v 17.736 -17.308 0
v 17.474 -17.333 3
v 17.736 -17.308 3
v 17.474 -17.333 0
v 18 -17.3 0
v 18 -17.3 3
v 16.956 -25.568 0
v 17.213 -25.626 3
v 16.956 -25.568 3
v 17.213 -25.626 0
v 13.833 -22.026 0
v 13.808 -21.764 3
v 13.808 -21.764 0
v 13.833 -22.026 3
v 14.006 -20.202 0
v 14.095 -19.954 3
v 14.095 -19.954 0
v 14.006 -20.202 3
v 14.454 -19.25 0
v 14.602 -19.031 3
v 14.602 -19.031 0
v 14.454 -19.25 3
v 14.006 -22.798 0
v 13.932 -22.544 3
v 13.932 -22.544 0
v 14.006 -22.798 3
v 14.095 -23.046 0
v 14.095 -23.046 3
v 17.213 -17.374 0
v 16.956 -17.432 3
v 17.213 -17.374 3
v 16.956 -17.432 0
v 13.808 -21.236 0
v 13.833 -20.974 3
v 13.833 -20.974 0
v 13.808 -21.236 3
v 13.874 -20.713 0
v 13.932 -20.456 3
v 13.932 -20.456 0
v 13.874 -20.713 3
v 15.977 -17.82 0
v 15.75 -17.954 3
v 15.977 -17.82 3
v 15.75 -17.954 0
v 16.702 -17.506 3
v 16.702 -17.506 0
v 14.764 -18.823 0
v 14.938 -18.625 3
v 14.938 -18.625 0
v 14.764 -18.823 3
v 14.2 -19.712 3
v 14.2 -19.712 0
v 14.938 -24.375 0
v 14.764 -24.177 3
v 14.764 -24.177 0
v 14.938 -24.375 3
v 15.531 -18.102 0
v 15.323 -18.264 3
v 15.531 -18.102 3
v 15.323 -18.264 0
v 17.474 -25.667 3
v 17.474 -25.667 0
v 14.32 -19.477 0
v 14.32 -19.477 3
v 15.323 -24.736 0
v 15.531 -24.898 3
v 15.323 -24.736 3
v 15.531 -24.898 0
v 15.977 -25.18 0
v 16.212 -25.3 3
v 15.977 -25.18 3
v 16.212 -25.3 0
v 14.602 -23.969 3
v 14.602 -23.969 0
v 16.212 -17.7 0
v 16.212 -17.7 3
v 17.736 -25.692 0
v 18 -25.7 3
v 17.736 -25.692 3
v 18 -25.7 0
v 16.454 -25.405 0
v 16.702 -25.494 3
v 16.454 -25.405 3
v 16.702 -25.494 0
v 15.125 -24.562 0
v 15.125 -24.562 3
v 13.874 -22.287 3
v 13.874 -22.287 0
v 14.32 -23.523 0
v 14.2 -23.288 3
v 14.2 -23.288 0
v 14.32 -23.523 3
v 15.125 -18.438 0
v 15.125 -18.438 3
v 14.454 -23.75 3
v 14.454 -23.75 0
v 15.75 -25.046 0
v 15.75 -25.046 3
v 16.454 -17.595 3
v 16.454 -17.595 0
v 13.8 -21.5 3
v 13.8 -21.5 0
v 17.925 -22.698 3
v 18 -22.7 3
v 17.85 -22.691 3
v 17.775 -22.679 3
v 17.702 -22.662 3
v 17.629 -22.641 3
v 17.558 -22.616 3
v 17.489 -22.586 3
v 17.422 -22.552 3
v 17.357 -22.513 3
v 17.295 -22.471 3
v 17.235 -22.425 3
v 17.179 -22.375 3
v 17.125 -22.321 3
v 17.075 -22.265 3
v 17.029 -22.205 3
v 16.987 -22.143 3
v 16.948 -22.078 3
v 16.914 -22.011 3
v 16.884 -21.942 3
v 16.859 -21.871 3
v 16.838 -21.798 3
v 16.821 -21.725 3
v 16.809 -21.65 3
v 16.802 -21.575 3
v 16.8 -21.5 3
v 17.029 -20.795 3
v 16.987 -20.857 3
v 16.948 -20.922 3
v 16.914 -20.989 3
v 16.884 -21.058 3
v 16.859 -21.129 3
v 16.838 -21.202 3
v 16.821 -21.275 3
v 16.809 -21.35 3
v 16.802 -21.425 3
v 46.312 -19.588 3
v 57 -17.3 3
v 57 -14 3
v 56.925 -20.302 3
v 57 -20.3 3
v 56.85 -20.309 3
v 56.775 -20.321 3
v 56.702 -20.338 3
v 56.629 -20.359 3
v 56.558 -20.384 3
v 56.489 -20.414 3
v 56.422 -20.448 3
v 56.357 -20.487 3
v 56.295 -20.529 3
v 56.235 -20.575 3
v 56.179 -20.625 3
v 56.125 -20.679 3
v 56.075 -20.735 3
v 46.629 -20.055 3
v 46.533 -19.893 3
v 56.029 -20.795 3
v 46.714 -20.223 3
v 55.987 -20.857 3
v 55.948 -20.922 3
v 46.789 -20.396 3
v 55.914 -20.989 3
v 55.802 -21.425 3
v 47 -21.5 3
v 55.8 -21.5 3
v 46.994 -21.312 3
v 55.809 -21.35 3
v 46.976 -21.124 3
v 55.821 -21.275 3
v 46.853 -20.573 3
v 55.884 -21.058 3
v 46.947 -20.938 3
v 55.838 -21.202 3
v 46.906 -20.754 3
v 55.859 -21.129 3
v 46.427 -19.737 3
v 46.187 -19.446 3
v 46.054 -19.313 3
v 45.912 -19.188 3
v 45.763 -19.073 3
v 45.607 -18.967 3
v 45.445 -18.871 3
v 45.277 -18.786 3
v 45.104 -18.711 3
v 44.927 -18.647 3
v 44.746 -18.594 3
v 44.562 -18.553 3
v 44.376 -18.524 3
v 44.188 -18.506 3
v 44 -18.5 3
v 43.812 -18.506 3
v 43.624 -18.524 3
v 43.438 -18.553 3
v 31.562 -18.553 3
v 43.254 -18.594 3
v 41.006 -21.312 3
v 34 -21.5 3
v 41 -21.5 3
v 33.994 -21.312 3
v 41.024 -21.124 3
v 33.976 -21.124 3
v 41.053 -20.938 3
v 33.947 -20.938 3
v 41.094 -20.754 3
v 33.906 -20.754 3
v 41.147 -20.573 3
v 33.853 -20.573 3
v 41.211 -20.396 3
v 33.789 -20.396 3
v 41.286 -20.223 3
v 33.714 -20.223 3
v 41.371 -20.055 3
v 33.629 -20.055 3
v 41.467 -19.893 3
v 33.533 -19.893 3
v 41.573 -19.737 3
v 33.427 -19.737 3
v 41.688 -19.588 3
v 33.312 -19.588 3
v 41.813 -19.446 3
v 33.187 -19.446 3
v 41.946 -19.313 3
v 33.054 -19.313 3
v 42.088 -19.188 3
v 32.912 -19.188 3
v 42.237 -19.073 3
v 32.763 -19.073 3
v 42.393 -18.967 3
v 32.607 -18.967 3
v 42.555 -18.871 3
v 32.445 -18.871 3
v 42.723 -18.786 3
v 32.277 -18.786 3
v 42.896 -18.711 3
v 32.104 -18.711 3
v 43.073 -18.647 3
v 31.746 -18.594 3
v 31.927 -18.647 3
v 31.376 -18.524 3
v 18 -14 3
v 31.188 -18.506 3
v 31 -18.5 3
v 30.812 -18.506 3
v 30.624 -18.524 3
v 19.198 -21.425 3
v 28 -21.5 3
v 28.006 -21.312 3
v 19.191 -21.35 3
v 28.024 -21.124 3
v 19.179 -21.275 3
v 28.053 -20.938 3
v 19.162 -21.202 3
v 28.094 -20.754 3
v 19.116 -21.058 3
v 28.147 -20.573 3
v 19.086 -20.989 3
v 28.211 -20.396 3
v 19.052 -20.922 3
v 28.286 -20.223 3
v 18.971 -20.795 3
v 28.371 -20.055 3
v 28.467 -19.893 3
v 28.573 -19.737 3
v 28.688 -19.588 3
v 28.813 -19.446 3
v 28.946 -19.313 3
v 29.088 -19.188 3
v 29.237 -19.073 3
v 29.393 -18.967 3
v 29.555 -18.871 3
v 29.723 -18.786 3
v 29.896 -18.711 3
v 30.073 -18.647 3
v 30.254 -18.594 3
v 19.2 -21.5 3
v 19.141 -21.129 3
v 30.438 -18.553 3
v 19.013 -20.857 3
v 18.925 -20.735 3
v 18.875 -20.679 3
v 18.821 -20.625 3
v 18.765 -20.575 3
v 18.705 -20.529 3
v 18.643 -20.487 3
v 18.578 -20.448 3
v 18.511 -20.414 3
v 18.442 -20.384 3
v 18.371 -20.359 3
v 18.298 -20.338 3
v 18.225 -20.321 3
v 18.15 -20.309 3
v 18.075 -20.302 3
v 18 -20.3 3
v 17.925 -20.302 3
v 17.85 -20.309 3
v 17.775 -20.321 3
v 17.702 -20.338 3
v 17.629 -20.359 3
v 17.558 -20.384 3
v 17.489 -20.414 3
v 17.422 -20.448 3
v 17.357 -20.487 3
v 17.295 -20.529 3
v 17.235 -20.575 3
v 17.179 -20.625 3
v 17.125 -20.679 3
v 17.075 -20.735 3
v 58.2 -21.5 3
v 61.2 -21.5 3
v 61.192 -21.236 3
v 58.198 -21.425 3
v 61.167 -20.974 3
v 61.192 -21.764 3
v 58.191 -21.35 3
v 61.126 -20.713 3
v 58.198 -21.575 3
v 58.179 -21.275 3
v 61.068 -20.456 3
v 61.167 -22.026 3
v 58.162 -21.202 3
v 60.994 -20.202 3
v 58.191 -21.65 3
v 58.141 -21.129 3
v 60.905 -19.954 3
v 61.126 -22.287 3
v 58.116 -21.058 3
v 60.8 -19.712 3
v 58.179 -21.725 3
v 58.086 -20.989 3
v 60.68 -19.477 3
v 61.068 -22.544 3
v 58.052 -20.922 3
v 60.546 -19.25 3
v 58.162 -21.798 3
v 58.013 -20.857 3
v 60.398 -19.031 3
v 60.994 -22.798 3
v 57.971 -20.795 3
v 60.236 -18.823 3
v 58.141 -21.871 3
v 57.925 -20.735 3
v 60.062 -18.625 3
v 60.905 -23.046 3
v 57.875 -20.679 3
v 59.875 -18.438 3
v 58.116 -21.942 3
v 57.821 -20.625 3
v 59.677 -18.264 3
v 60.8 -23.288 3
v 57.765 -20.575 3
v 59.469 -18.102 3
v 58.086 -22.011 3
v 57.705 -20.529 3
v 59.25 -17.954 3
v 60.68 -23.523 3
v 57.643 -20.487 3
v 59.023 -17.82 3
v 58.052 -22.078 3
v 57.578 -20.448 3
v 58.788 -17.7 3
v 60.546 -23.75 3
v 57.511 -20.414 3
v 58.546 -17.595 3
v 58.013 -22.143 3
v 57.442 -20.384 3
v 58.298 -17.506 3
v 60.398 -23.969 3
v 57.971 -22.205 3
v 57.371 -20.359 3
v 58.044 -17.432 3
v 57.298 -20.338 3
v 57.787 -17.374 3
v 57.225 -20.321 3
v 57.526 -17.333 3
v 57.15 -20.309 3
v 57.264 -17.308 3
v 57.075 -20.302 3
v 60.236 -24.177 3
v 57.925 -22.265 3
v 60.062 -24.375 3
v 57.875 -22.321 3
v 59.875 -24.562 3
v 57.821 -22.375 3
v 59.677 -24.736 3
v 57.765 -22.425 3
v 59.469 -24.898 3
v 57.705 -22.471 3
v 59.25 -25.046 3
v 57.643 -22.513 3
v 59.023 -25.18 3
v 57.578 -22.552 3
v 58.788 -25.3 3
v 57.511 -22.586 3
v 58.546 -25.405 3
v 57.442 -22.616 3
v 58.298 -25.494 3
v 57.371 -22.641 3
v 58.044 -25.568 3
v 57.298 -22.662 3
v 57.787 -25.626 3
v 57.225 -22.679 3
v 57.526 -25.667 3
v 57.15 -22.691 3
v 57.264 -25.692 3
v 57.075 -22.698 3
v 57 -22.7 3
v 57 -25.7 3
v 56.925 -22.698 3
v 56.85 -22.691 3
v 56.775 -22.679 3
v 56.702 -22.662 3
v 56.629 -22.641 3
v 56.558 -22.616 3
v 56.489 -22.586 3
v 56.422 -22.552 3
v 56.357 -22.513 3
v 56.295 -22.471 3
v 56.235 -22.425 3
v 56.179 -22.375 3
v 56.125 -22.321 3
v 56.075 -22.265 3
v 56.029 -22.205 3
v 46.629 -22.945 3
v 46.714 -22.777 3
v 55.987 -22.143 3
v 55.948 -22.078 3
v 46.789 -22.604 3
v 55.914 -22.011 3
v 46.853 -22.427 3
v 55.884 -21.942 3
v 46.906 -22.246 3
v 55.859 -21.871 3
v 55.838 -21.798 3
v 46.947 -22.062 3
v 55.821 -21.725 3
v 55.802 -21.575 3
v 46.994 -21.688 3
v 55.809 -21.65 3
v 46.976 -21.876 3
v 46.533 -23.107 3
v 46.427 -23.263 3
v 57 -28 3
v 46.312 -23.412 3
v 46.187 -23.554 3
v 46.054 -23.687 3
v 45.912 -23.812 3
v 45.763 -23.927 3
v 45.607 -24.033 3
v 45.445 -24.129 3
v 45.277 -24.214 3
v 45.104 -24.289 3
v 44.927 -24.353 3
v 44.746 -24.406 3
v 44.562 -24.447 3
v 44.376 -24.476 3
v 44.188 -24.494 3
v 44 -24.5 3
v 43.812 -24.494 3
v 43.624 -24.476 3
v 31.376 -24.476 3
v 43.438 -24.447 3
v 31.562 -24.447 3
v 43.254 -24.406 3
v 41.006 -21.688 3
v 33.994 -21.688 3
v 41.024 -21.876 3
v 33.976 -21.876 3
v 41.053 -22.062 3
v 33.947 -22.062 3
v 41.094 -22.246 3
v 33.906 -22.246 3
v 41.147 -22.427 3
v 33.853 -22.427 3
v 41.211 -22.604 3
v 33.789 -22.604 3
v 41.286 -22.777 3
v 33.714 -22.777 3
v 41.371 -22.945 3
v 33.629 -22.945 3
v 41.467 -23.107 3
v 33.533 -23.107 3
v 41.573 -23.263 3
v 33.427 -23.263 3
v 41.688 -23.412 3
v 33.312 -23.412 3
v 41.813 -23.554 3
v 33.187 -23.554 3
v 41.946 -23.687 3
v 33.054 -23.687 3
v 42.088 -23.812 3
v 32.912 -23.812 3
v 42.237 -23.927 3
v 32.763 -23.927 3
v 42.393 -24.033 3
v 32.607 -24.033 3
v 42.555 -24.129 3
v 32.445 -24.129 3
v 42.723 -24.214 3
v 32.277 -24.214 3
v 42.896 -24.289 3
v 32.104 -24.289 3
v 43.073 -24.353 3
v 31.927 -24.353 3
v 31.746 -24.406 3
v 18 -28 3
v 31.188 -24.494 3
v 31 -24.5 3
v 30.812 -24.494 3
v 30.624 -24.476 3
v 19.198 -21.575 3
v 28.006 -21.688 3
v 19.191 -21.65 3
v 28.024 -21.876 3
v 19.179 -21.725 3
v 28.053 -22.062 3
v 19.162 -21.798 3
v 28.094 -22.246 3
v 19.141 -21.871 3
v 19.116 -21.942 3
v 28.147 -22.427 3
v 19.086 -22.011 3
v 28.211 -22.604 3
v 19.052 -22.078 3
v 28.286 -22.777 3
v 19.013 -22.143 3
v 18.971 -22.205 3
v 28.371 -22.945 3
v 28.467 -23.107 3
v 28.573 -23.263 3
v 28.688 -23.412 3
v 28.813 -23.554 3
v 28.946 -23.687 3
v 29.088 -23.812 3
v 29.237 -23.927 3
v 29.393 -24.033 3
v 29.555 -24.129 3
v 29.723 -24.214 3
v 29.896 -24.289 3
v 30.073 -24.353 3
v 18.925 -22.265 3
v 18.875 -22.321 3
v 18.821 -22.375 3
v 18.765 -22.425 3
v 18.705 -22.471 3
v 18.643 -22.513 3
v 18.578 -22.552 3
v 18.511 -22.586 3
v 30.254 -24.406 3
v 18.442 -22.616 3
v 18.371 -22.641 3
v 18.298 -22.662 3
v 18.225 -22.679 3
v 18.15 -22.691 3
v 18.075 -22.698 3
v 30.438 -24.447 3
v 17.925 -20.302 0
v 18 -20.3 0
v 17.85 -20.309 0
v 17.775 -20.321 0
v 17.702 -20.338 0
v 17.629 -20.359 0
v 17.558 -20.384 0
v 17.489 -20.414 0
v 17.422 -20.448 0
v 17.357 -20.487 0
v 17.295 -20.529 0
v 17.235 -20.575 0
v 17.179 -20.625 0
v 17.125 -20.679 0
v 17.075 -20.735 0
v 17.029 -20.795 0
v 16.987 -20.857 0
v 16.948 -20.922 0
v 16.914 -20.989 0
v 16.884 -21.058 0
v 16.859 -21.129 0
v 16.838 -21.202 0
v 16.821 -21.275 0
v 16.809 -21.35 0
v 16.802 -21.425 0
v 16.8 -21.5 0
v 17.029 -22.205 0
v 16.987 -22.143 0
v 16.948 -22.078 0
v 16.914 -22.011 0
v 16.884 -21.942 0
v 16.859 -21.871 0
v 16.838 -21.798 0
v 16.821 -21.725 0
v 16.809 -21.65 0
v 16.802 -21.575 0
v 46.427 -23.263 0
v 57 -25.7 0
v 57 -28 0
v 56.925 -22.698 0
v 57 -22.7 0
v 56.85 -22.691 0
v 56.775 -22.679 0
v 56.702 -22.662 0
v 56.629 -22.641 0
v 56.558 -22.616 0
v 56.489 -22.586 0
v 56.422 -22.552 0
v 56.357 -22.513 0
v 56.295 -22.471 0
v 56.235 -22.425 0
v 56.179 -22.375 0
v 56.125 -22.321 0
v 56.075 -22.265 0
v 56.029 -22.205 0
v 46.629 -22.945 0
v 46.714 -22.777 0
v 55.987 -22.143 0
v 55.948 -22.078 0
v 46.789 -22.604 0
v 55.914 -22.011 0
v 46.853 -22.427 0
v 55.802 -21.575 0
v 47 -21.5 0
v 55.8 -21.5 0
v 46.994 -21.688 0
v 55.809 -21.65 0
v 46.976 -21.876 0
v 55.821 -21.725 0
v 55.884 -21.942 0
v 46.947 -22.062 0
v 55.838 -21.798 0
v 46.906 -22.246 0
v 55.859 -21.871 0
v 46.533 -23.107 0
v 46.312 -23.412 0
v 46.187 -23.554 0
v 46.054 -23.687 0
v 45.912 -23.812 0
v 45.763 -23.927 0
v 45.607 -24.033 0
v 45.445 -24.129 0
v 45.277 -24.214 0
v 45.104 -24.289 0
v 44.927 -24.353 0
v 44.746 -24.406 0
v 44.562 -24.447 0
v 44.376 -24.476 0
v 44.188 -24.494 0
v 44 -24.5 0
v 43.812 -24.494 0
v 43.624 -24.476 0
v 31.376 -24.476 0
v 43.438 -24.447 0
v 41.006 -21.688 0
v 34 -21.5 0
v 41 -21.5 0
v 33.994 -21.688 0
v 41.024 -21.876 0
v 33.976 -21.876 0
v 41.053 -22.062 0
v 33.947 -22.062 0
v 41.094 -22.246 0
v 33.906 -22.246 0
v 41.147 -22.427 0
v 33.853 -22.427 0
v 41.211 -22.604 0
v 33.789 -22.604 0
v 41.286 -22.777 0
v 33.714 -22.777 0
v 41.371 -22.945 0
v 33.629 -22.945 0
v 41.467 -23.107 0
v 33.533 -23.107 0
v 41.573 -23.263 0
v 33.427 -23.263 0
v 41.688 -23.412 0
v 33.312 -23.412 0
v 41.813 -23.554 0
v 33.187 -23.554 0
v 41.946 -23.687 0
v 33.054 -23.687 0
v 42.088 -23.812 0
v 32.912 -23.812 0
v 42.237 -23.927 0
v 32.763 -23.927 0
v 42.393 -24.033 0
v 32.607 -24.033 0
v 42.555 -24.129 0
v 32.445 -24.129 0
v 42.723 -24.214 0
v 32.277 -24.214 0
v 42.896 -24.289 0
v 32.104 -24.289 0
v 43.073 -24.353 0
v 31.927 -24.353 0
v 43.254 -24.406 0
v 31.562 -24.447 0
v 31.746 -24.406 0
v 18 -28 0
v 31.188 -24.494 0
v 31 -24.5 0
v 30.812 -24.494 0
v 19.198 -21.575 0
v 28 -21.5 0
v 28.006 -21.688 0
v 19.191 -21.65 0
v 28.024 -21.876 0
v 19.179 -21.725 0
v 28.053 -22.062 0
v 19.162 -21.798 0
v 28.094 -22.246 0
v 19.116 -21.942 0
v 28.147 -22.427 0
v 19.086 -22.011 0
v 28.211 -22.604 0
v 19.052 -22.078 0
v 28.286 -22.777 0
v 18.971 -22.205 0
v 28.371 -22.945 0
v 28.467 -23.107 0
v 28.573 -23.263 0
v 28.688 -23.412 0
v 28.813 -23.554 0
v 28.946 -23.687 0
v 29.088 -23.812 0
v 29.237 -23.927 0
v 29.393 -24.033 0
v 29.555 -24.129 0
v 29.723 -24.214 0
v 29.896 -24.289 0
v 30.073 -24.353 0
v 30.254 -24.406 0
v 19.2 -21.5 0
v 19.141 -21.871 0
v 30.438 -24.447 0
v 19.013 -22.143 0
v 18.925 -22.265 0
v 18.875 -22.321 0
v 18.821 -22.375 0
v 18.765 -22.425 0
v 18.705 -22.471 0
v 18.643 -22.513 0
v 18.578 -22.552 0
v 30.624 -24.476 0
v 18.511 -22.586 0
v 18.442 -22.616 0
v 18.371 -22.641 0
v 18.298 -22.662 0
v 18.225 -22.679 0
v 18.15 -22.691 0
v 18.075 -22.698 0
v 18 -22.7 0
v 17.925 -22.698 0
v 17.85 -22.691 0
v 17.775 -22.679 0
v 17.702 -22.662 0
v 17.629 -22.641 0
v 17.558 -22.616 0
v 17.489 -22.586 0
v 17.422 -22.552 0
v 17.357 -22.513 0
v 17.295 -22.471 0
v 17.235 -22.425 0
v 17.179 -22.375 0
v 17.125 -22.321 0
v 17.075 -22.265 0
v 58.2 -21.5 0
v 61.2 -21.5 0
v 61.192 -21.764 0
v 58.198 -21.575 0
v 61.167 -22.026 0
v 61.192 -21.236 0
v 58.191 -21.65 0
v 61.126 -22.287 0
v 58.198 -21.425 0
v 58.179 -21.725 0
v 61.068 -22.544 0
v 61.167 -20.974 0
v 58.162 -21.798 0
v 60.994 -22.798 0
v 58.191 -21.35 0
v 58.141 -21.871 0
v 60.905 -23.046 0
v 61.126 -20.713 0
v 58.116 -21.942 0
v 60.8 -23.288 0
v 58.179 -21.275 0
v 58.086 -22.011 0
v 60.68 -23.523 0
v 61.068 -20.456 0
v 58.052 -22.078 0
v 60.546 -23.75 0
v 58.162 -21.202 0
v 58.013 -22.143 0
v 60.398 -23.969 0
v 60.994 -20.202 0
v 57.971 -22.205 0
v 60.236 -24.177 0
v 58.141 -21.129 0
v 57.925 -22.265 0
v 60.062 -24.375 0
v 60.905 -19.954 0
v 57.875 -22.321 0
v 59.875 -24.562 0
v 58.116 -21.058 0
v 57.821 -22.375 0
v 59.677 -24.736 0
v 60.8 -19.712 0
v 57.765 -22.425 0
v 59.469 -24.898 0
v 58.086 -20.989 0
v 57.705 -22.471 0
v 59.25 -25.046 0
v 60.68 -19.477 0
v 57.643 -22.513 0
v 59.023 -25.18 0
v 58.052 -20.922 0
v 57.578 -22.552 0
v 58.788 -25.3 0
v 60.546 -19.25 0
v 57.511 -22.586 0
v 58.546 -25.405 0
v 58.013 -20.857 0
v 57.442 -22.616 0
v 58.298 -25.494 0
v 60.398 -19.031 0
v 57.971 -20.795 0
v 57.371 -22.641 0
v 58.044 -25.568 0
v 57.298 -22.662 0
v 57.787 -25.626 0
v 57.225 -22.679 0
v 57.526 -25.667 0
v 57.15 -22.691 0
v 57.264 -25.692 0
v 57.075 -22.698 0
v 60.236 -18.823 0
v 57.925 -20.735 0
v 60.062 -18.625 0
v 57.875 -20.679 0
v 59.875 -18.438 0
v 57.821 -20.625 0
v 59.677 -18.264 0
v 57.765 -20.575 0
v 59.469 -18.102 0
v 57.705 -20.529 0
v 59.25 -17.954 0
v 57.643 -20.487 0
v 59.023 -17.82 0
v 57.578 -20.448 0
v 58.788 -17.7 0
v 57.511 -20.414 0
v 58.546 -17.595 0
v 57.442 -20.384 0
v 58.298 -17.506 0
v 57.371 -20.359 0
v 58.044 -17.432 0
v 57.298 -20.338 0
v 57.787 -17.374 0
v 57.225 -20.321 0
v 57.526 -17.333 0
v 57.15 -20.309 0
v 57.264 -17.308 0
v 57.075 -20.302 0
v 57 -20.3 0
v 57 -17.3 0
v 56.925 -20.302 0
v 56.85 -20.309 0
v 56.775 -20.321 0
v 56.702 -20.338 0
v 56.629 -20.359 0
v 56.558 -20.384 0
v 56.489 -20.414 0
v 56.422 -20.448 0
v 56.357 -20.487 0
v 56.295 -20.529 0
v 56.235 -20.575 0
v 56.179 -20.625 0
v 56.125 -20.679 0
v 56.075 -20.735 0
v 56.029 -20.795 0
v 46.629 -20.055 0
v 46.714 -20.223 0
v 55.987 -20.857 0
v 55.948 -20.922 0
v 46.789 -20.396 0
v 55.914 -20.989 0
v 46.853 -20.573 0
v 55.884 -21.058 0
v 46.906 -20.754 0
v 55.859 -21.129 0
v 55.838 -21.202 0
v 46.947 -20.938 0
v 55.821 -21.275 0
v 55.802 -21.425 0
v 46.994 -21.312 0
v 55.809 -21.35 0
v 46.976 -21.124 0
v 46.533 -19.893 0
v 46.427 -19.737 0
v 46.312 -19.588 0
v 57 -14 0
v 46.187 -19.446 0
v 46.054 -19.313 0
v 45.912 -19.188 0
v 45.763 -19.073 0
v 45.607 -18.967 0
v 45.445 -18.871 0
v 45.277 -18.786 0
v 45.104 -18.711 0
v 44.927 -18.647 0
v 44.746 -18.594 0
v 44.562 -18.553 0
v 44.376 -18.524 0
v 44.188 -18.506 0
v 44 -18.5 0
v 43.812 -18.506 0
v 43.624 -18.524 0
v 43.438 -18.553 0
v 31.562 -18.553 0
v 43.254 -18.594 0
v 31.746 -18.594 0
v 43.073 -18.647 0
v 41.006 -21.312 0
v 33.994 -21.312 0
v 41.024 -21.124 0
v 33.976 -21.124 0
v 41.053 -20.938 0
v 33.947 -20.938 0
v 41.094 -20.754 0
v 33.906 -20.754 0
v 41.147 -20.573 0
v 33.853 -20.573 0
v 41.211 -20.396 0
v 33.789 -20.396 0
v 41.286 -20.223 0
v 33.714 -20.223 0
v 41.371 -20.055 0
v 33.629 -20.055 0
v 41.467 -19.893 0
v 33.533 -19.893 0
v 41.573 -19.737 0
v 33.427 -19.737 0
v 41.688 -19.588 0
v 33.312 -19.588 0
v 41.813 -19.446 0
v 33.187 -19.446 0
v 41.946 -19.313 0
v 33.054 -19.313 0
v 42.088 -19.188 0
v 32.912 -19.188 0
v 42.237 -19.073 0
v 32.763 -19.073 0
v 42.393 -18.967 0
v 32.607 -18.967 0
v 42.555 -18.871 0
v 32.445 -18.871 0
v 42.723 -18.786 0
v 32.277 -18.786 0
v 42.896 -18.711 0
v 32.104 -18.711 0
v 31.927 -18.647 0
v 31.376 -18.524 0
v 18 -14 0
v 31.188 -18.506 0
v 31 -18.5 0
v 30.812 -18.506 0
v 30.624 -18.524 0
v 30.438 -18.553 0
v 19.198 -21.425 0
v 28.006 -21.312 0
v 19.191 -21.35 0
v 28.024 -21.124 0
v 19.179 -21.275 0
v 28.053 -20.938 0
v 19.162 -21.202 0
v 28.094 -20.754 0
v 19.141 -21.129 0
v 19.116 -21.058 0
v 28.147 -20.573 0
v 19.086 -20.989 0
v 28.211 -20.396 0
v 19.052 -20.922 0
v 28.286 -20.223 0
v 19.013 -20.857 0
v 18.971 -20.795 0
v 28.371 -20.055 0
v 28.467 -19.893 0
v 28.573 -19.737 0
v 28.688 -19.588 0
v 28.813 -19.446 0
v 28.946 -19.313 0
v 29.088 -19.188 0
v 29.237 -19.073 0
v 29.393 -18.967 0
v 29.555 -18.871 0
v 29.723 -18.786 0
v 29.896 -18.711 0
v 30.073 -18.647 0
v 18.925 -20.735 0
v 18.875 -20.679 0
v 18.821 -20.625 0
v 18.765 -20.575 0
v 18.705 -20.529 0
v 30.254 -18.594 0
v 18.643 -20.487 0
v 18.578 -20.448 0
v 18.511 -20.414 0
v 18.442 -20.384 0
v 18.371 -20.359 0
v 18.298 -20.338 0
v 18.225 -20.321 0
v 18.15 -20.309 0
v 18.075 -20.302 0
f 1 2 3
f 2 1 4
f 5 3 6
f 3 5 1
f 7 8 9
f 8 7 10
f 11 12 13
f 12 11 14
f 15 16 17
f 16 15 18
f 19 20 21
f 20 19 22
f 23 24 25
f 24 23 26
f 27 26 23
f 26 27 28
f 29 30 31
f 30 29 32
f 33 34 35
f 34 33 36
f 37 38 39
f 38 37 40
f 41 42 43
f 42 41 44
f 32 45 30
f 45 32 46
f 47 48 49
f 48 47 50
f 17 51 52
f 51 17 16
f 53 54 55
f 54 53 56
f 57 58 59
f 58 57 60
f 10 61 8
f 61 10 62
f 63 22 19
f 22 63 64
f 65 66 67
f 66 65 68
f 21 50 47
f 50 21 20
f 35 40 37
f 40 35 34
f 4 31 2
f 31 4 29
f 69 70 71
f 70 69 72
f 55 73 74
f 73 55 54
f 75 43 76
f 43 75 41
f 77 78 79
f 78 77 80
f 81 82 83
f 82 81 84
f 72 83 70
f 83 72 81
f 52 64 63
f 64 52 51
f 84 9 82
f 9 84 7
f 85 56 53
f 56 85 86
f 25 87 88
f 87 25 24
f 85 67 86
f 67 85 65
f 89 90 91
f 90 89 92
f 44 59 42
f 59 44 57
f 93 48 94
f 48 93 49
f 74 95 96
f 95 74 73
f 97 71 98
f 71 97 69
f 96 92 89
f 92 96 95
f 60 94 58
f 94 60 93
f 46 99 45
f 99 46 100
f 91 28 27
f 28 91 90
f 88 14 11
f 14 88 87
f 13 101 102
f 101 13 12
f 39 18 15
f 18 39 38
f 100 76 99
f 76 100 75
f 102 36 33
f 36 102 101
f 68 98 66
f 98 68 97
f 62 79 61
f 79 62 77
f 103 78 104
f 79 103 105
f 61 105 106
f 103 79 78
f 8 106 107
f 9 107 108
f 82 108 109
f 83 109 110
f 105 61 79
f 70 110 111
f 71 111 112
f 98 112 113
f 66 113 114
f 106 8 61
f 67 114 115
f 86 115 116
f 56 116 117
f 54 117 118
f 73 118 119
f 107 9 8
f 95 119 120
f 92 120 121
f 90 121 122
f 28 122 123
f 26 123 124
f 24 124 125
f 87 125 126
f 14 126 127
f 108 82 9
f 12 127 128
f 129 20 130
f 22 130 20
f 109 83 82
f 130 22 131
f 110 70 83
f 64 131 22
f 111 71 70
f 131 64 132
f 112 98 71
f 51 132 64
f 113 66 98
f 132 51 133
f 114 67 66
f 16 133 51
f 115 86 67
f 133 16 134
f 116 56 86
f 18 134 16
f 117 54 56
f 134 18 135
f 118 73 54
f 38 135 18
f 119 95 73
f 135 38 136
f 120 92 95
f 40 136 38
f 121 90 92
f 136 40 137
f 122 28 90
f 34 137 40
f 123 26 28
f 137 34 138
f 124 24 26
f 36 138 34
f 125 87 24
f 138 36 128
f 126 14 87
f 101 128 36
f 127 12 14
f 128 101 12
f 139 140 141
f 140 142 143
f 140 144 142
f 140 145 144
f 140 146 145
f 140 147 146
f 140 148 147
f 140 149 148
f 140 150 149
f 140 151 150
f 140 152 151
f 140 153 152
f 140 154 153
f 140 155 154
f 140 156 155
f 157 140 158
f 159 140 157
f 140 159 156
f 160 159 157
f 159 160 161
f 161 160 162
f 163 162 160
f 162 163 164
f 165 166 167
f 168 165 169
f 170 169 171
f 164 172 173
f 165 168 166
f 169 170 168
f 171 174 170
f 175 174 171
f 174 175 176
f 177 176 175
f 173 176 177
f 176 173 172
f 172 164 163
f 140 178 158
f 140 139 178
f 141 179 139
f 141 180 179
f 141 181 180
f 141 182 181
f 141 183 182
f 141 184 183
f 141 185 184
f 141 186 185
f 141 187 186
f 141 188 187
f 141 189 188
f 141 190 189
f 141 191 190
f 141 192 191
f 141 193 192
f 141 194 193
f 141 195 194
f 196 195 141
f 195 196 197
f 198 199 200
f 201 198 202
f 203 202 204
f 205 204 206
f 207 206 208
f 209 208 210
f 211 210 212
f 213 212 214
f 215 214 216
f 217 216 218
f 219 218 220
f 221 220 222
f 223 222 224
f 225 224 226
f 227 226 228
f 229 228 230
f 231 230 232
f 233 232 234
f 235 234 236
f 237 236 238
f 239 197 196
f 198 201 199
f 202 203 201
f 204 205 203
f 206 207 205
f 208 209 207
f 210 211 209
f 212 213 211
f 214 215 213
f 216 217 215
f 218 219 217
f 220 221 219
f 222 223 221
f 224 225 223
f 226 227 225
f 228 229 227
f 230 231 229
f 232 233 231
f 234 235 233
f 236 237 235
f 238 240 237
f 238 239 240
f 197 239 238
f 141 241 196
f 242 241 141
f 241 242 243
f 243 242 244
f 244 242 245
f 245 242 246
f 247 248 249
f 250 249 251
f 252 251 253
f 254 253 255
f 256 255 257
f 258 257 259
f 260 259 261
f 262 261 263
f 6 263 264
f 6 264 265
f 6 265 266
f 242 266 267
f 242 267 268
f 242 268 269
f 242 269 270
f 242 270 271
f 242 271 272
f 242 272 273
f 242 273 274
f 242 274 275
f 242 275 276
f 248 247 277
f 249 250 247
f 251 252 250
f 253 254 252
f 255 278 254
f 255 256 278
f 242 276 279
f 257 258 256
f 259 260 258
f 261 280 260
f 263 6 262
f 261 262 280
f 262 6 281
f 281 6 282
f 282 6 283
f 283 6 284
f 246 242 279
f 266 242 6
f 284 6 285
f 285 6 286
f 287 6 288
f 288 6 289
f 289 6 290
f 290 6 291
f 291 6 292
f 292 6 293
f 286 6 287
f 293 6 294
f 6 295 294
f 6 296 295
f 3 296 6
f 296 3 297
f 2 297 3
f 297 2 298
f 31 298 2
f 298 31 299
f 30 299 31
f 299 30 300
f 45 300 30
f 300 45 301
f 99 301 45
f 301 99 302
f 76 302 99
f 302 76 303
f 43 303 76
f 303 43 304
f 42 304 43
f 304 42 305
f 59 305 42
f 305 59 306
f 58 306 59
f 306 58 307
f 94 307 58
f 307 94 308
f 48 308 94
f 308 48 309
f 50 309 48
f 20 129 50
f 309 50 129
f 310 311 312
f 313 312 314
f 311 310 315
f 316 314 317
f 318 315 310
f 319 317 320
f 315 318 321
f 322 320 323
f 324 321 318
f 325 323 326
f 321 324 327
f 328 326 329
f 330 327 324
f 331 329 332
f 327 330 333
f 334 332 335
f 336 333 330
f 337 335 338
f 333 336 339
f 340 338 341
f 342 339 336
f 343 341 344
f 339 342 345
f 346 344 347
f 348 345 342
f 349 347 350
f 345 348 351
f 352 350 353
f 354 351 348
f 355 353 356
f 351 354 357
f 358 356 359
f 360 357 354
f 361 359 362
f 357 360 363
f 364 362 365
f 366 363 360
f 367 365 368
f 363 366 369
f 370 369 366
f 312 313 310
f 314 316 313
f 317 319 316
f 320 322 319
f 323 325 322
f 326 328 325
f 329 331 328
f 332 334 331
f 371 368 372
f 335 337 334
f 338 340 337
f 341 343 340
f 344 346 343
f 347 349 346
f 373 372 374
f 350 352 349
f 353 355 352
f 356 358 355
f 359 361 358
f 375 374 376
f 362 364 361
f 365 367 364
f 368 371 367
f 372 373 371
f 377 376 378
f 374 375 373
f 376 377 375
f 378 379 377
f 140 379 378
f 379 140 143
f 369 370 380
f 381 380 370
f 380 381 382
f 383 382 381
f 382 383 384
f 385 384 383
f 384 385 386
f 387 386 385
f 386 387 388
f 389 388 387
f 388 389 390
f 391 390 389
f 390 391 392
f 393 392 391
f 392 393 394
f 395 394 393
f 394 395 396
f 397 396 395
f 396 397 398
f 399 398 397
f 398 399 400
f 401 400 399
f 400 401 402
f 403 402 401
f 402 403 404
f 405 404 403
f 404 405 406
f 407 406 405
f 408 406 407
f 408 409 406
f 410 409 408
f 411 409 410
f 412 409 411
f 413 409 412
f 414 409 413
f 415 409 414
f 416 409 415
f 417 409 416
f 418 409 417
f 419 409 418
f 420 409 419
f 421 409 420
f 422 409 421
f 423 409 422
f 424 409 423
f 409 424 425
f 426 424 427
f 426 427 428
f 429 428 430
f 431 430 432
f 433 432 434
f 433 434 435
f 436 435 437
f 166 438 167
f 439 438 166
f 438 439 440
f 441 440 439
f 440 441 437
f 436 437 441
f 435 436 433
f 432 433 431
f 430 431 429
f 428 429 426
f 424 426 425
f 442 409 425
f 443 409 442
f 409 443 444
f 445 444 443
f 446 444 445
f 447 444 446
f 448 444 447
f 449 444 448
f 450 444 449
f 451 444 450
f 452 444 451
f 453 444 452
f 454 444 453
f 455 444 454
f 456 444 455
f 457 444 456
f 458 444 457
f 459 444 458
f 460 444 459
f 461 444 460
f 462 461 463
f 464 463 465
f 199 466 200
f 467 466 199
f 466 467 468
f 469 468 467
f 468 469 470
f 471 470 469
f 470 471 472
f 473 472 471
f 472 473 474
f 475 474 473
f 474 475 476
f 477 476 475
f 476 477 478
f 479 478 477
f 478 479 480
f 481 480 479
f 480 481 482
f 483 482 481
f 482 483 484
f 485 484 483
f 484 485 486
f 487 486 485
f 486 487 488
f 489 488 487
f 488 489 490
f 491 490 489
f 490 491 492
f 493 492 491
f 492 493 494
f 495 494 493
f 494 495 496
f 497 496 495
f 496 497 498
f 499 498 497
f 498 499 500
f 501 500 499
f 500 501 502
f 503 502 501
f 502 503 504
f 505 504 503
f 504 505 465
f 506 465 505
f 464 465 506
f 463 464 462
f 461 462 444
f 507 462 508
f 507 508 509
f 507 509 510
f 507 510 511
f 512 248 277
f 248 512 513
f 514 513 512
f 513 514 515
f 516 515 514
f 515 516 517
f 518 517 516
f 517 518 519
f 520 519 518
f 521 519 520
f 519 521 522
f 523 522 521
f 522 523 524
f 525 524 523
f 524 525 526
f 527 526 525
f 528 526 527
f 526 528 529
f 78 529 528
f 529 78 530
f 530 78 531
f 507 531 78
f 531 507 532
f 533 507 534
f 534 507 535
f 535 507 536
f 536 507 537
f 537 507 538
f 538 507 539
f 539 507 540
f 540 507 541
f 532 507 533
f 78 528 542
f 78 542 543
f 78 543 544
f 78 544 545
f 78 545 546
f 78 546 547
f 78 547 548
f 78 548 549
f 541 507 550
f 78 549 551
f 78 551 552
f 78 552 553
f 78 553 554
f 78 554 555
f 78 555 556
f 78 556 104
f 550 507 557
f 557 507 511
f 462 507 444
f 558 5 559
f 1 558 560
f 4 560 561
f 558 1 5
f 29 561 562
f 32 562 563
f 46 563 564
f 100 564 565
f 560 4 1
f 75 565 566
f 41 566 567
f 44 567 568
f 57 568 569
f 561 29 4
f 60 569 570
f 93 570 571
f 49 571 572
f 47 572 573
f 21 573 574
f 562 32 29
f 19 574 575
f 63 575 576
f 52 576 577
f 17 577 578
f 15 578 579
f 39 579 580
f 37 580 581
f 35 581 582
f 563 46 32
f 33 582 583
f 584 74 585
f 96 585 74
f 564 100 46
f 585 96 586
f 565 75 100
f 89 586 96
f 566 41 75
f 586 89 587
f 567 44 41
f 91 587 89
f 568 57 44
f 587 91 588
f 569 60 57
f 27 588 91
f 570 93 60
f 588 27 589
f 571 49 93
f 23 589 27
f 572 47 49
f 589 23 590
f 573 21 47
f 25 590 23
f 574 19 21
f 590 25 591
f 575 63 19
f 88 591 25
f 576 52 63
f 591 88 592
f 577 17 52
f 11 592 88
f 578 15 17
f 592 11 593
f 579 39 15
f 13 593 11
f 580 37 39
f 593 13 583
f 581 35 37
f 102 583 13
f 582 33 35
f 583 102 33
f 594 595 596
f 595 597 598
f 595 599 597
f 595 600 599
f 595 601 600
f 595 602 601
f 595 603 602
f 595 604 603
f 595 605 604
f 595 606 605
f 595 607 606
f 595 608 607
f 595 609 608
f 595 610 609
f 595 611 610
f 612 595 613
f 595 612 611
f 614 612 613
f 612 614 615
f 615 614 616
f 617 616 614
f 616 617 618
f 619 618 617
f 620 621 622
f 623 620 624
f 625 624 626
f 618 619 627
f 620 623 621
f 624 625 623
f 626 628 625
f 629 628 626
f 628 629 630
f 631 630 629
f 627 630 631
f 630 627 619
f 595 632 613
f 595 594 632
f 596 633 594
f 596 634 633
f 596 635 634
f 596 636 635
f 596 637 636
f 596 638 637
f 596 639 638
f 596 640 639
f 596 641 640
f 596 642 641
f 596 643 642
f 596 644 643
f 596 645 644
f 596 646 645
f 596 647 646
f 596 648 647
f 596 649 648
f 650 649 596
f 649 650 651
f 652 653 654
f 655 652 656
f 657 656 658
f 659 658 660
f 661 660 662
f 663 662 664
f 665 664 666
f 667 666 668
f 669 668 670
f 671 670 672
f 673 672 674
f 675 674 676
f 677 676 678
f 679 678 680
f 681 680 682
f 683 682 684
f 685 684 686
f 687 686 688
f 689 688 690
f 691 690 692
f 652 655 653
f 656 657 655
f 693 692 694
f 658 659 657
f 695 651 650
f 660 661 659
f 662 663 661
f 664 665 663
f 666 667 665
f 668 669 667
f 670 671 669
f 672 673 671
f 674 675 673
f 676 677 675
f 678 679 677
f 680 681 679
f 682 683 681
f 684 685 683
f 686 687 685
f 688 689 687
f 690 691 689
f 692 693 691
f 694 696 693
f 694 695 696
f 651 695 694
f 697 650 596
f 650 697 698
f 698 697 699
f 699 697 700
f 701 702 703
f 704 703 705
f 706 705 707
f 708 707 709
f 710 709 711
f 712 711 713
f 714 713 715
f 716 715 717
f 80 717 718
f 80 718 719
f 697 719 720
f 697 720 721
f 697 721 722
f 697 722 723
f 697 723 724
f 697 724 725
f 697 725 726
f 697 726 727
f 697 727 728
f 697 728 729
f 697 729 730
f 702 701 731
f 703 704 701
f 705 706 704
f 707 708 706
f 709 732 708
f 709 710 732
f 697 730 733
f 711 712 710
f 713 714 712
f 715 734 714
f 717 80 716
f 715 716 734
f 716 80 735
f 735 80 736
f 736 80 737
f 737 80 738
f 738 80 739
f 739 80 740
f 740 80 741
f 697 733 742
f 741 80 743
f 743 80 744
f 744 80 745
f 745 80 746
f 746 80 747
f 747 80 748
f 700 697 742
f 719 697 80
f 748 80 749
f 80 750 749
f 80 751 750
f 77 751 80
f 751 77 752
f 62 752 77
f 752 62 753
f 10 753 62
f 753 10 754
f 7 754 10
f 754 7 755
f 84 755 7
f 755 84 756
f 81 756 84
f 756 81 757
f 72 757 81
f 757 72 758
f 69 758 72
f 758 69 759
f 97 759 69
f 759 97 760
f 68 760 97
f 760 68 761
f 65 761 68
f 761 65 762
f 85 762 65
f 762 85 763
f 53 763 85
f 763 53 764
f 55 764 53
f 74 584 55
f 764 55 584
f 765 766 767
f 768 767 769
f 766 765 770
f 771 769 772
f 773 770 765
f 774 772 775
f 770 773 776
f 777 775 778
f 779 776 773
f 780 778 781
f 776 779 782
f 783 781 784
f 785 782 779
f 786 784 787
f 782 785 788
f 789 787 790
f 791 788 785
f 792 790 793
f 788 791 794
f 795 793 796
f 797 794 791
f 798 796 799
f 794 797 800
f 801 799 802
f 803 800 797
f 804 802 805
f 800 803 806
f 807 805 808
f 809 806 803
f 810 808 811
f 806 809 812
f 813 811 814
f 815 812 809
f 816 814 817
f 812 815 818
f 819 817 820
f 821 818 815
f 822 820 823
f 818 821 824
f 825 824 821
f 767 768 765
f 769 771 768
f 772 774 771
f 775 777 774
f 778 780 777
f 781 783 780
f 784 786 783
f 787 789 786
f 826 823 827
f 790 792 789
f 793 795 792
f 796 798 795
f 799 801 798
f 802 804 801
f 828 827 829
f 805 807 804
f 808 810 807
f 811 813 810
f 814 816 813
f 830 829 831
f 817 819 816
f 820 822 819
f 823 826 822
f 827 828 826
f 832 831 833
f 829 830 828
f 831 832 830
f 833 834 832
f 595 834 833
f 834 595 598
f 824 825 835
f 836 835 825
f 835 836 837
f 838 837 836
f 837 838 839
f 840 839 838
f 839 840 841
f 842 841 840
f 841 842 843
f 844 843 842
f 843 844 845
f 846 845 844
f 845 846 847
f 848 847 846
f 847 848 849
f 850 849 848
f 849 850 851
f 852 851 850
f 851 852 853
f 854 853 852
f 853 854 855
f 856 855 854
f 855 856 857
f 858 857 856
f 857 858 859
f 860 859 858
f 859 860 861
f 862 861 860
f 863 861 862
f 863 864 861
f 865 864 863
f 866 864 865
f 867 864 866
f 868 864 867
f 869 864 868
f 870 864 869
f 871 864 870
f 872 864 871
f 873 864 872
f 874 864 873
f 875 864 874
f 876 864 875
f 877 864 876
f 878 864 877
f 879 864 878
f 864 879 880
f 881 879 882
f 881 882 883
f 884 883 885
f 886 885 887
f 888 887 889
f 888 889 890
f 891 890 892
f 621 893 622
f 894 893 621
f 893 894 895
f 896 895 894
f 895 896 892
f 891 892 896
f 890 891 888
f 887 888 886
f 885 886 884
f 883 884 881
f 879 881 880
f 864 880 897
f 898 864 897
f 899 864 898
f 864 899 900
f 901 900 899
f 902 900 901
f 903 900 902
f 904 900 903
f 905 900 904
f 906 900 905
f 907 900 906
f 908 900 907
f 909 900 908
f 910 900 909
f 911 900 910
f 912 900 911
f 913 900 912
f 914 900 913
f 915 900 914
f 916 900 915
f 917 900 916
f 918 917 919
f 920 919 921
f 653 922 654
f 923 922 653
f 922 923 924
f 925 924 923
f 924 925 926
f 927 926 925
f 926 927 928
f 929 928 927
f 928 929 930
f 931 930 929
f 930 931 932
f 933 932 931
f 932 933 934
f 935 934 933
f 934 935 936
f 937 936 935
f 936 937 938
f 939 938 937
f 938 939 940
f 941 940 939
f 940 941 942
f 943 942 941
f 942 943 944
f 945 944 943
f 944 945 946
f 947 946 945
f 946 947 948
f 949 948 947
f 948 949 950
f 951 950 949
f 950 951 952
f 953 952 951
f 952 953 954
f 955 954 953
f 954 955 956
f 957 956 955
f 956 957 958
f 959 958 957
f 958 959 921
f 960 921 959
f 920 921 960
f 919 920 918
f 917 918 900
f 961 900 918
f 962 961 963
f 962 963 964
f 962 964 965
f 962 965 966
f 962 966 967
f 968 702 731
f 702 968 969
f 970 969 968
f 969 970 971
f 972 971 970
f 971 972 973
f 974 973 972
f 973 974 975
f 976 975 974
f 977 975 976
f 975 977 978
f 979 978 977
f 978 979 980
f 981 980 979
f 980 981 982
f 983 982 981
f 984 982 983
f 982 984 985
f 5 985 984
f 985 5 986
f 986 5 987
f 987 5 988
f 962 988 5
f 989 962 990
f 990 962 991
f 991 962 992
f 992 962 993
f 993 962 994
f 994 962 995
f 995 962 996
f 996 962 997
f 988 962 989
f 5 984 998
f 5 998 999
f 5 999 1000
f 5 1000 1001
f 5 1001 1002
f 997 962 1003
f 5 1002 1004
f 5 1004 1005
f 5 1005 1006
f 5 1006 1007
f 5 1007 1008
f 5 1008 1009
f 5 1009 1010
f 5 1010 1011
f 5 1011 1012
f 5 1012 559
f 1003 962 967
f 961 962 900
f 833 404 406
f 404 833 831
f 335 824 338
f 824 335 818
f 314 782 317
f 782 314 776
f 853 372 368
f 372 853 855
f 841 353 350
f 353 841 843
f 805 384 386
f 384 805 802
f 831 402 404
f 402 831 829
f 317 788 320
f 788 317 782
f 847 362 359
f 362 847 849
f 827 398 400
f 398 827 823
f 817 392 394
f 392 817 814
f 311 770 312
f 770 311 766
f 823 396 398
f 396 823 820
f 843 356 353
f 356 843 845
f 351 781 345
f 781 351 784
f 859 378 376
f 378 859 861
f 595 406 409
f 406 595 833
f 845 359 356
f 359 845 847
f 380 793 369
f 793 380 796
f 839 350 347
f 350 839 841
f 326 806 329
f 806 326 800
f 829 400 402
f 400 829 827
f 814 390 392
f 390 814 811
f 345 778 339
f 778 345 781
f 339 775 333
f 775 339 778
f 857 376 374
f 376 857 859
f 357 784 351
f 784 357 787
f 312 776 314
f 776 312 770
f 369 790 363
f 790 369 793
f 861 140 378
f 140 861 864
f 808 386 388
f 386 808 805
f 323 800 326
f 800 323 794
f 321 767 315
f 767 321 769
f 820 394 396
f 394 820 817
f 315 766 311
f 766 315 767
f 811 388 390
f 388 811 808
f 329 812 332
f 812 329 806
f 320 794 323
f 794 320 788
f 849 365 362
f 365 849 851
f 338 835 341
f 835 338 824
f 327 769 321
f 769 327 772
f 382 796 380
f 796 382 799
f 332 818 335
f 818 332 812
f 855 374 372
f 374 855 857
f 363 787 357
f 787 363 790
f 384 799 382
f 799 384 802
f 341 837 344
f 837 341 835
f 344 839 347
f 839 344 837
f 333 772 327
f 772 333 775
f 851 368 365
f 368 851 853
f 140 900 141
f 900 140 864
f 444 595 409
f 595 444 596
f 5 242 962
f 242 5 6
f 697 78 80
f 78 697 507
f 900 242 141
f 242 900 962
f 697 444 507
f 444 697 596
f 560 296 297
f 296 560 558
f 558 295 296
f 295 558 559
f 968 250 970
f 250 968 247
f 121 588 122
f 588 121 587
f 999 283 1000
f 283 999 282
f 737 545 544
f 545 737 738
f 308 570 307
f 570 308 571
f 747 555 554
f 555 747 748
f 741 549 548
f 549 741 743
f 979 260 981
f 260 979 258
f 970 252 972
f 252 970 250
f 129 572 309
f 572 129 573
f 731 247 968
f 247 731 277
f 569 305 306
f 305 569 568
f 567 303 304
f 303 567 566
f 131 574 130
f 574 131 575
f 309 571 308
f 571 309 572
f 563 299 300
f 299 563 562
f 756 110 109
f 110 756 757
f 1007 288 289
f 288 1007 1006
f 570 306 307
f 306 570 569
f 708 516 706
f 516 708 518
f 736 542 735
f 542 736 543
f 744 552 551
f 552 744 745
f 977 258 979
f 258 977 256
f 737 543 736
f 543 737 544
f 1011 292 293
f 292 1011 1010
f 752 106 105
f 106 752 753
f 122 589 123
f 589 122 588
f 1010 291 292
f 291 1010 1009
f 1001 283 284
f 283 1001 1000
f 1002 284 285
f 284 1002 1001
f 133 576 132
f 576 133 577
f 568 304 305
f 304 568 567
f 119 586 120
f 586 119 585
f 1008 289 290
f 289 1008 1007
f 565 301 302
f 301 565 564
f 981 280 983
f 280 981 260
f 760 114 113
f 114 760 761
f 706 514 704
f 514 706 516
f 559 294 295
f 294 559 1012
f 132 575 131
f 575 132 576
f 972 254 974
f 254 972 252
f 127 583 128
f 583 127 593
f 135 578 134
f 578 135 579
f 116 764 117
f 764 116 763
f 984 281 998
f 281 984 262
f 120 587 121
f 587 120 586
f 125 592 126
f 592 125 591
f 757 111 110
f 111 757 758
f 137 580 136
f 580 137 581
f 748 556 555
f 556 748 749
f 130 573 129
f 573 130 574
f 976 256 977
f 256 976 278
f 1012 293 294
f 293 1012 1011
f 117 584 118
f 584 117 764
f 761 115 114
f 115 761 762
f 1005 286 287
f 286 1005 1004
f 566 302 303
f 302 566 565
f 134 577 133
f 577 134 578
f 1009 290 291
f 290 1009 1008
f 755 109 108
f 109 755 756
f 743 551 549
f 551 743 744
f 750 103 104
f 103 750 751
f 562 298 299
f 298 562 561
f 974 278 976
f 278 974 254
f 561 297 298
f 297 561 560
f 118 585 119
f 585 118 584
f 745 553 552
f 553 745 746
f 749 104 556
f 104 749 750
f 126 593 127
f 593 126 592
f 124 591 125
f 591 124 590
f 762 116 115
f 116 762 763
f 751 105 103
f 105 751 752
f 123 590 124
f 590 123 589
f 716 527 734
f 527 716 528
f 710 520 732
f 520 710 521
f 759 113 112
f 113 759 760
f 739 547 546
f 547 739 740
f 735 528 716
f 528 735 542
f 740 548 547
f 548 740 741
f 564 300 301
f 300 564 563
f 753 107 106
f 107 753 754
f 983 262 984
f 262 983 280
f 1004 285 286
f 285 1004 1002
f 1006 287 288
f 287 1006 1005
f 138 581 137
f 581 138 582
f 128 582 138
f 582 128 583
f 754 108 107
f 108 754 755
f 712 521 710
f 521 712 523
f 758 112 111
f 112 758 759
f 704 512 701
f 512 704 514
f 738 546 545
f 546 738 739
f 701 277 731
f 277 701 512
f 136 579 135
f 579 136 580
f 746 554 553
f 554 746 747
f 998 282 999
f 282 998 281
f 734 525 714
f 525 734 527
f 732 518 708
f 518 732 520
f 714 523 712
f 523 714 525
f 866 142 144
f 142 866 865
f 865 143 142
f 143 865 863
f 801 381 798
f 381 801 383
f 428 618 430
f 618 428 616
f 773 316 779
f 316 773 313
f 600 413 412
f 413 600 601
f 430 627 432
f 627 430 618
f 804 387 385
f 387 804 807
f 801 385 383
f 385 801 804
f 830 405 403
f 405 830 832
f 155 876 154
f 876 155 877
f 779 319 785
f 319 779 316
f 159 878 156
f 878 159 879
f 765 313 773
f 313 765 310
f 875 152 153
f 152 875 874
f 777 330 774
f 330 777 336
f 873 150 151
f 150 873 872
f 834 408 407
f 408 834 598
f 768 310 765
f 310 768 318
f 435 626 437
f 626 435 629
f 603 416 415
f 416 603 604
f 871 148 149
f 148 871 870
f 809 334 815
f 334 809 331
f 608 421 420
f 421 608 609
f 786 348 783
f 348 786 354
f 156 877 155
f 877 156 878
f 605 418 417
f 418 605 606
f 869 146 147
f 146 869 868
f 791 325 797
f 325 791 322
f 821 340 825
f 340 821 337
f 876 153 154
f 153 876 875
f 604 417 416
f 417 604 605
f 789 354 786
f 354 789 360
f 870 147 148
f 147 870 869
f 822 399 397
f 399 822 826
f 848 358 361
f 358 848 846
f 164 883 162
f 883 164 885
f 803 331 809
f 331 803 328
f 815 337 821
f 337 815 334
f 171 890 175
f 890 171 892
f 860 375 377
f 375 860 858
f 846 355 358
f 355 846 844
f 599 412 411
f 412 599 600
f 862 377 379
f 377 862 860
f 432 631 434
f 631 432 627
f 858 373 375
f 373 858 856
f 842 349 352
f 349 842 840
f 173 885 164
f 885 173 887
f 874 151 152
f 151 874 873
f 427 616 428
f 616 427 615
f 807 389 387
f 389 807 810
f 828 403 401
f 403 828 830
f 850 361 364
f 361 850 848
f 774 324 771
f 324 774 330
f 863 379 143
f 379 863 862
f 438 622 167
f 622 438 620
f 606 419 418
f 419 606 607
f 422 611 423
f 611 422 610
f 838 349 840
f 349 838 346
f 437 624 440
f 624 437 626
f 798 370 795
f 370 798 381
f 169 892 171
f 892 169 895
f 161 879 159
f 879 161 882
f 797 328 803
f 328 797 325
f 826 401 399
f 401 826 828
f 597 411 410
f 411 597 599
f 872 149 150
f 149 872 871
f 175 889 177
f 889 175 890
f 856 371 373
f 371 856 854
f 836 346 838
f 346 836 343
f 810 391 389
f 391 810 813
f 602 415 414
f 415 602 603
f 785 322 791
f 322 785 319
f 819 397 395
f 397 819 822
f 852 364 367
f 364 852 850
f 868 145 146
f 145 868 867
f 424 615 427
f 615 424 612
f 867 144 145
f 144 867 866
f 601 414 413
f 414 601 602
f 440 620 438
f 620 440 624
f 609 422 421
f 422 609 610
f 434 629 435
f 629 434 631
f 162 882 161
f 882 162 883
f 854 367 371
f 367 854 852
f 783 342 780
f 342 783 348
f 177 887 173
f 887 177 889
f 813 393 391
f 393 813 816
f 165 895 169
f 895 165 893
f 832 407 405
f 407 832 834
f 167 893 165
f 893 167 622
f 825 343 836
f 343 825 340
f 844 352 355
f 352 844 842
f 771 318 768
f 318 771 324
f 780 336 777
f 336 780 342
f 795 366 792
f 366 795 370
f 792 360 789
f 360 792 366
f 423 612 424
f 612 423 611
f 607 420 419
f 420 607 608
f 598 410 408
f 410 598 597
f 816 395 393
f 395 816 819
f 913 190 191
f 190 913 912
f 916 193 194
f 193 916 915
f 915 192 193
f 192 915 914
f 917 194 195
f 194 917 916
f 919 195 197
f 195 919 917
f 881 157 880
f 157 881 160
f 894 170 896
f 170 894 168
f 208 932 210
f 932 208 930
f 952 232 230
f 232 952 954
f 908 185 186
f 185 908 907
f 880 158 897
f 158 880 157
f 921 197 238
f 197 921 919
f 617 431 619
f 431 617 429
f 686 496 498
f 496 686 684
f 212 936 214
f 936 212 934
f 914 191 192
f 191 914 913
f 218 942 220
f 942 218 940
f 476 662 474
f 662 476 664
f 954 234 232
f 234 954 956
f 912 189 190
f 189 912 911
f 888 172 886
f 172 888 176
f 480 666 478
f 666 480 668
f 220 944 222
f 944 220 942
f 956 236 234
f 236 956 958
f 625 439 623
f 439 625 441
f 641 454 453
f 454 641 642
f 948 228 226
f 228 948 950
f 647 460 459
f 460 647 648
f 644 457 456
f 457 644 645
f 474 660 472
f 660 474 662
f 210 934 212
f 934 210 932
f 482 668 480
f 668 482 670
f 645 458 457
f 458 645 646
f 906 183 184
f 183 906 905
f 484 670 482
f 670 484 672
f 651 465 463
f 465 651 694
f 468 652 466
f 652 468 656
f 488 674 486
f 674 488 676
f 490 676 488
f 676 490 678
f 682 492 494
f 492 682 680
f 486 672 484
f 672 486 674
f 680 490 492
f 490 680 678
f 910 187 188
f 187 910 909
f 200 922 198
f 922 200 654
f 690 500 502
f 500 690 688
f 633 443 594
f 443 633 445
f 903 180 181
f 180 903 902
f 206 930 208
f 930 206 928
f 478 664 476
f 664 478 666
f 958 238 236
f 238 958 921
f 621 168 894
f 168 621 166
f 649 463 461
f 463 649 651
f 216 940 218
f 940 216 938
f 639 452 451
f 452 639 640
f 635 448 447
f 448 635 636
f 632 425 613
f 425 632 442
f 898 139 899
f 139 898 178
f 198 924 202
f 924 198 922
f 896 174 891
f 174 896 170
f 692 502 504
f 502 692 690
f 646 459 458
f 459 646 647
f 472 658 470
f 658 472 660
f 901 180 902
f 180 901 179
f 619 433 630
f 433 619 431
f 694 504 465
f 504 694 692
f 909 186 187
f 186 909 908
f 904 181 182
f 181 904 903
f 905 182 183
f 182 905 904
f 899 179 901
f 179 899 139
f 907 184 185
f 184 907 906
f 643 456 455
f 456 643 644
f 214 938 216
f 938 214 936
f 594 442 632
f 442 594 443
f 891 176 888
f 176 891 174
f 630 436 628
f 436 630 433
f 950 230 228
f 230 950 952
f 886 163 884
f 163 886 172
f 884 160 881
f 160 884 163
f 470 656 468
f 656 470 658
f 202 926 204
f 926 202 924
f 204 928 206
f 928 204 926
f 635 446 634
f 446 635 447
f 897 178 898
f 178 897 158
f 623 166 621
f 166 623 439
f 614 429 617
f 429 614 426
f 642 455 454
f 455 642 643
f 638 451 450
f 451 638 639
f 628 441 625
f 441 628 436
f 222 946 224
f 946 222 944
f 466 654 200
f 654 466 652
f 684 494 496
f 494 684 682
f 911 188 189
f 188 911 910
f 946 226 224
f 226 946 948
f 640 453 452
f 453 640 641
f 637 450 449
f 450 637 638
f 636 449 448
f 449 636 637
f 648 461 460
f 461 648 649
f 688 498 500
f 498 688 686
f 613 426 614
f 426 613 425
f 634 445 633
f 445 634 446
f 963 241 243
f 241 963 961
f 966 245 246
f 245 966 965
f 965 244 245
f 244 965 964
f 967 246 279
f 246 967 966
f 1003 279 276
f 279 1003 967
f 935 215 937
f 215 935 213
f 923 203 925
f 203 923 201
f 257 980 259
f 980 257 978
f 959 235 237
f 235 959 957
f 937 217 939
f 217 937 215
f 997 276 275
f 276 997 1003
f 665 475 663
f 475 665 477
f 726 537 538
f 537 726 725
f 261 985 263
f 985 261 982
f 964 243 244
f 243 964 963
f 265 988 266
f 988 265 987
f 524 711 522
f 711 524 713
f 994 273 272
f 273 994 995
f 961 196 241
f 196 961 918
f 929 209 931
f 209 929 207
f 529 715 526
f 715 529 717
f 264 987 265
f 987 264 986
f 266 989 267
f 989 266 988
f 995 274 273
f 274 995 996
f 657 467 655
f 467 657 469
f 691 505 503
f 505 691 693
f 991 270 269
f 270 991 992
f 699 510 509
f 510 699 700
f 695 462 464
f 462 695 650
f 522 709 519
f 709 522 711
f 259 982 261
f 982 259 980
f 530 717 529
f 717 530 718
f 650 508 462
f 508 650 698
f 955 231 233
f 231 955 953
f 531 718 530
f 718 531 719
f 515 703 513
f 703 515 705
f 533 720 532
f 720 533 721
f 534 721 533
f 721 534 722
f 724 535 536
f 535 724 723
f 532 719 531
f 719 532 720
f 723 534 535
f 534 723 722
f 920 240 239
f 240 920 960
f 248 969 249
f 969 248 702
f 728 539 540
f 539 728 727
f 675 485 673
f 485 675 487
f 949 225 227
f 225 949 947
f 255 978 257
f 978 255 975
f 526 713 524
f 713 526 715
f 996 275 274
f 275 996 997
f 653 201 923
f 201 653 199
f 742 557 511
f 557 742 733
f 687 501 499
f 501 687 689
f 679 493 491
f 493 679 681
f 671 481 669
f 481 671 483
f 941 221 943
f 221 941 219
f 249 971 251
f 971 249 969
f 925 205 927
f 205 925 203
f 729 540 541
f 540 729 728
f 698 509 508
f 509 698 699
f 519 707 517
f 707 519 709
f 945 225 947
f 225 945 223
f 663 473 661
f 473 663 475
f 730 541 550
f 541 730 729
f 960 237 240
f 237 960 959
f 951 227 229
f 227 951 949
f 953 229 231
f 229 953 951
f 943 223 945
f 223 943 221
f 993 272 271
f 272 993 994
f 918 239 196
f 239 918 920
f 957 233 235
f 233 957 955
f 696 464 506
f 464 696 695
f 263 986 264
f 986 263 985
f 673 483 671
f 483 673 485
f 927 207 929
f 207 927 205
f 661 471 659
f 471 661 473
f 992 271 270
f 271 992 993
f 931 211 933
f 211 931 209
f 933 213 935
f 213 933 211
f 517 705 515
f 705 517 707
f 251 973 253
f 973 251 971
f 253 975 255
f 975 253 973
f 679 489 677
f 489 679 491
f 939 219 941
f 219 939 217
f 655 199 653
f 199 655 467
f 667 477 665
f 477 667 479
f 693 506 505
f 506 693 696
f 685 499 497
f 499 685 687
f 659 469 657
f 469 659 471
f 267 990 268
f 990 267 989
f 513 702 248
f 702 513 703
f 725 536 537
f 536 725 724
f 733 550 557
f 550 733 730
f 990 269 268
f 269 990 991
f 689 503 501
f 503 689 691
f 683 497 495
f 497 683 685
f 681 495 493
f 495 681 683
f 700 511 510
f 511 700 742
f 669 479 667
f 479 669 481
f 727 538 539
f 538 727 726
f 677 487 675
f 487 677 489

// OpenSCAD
difference(){
	union(){


        
        // verdikking voor schuifcontacten

        translate([18,24-52+6.5,0]){
            rotate([0,0,90]){
                cylinder(h=3, r=4.2, $fn=100, center=false);
            }
        }        
        translate([18+39,24-52+6.5,0]){
            rotate([0,0,90]){
                cylinder(h=3, r=4.2, $fn=100, center=false);
            }
        }        
        translate([18,24-52,0]){
           cube([39,14,3], center=false);
        }


        
	}
	union() {

        // schroefgaten deksel verticale assen
        translate([18,24-52+6.5,-1]){
            rotate([0,0,90]){
                cylinder(h=48, r=1.2, $fn=100, center=false);
            }
        }        
        translate([18+39,24-52+6.5,-1]){
            rotate([0,0,90]){
                cylinder(h=48, r=1.2, $fn=100, center=false);
            }
        }        

        translate([18+39-13,24-52+6.5,-1]){
            rotate([0,0,90]){
                cylinder(h=48, r=3, $fn=100, center=false);
            }
        }        
        translate([18+13,24-52+6.5,-1]){
            rotate([0,0,90]){
                cylinder(h=48, r=3, $fn=100, center=false);
            }
        }        
        

	}
}
